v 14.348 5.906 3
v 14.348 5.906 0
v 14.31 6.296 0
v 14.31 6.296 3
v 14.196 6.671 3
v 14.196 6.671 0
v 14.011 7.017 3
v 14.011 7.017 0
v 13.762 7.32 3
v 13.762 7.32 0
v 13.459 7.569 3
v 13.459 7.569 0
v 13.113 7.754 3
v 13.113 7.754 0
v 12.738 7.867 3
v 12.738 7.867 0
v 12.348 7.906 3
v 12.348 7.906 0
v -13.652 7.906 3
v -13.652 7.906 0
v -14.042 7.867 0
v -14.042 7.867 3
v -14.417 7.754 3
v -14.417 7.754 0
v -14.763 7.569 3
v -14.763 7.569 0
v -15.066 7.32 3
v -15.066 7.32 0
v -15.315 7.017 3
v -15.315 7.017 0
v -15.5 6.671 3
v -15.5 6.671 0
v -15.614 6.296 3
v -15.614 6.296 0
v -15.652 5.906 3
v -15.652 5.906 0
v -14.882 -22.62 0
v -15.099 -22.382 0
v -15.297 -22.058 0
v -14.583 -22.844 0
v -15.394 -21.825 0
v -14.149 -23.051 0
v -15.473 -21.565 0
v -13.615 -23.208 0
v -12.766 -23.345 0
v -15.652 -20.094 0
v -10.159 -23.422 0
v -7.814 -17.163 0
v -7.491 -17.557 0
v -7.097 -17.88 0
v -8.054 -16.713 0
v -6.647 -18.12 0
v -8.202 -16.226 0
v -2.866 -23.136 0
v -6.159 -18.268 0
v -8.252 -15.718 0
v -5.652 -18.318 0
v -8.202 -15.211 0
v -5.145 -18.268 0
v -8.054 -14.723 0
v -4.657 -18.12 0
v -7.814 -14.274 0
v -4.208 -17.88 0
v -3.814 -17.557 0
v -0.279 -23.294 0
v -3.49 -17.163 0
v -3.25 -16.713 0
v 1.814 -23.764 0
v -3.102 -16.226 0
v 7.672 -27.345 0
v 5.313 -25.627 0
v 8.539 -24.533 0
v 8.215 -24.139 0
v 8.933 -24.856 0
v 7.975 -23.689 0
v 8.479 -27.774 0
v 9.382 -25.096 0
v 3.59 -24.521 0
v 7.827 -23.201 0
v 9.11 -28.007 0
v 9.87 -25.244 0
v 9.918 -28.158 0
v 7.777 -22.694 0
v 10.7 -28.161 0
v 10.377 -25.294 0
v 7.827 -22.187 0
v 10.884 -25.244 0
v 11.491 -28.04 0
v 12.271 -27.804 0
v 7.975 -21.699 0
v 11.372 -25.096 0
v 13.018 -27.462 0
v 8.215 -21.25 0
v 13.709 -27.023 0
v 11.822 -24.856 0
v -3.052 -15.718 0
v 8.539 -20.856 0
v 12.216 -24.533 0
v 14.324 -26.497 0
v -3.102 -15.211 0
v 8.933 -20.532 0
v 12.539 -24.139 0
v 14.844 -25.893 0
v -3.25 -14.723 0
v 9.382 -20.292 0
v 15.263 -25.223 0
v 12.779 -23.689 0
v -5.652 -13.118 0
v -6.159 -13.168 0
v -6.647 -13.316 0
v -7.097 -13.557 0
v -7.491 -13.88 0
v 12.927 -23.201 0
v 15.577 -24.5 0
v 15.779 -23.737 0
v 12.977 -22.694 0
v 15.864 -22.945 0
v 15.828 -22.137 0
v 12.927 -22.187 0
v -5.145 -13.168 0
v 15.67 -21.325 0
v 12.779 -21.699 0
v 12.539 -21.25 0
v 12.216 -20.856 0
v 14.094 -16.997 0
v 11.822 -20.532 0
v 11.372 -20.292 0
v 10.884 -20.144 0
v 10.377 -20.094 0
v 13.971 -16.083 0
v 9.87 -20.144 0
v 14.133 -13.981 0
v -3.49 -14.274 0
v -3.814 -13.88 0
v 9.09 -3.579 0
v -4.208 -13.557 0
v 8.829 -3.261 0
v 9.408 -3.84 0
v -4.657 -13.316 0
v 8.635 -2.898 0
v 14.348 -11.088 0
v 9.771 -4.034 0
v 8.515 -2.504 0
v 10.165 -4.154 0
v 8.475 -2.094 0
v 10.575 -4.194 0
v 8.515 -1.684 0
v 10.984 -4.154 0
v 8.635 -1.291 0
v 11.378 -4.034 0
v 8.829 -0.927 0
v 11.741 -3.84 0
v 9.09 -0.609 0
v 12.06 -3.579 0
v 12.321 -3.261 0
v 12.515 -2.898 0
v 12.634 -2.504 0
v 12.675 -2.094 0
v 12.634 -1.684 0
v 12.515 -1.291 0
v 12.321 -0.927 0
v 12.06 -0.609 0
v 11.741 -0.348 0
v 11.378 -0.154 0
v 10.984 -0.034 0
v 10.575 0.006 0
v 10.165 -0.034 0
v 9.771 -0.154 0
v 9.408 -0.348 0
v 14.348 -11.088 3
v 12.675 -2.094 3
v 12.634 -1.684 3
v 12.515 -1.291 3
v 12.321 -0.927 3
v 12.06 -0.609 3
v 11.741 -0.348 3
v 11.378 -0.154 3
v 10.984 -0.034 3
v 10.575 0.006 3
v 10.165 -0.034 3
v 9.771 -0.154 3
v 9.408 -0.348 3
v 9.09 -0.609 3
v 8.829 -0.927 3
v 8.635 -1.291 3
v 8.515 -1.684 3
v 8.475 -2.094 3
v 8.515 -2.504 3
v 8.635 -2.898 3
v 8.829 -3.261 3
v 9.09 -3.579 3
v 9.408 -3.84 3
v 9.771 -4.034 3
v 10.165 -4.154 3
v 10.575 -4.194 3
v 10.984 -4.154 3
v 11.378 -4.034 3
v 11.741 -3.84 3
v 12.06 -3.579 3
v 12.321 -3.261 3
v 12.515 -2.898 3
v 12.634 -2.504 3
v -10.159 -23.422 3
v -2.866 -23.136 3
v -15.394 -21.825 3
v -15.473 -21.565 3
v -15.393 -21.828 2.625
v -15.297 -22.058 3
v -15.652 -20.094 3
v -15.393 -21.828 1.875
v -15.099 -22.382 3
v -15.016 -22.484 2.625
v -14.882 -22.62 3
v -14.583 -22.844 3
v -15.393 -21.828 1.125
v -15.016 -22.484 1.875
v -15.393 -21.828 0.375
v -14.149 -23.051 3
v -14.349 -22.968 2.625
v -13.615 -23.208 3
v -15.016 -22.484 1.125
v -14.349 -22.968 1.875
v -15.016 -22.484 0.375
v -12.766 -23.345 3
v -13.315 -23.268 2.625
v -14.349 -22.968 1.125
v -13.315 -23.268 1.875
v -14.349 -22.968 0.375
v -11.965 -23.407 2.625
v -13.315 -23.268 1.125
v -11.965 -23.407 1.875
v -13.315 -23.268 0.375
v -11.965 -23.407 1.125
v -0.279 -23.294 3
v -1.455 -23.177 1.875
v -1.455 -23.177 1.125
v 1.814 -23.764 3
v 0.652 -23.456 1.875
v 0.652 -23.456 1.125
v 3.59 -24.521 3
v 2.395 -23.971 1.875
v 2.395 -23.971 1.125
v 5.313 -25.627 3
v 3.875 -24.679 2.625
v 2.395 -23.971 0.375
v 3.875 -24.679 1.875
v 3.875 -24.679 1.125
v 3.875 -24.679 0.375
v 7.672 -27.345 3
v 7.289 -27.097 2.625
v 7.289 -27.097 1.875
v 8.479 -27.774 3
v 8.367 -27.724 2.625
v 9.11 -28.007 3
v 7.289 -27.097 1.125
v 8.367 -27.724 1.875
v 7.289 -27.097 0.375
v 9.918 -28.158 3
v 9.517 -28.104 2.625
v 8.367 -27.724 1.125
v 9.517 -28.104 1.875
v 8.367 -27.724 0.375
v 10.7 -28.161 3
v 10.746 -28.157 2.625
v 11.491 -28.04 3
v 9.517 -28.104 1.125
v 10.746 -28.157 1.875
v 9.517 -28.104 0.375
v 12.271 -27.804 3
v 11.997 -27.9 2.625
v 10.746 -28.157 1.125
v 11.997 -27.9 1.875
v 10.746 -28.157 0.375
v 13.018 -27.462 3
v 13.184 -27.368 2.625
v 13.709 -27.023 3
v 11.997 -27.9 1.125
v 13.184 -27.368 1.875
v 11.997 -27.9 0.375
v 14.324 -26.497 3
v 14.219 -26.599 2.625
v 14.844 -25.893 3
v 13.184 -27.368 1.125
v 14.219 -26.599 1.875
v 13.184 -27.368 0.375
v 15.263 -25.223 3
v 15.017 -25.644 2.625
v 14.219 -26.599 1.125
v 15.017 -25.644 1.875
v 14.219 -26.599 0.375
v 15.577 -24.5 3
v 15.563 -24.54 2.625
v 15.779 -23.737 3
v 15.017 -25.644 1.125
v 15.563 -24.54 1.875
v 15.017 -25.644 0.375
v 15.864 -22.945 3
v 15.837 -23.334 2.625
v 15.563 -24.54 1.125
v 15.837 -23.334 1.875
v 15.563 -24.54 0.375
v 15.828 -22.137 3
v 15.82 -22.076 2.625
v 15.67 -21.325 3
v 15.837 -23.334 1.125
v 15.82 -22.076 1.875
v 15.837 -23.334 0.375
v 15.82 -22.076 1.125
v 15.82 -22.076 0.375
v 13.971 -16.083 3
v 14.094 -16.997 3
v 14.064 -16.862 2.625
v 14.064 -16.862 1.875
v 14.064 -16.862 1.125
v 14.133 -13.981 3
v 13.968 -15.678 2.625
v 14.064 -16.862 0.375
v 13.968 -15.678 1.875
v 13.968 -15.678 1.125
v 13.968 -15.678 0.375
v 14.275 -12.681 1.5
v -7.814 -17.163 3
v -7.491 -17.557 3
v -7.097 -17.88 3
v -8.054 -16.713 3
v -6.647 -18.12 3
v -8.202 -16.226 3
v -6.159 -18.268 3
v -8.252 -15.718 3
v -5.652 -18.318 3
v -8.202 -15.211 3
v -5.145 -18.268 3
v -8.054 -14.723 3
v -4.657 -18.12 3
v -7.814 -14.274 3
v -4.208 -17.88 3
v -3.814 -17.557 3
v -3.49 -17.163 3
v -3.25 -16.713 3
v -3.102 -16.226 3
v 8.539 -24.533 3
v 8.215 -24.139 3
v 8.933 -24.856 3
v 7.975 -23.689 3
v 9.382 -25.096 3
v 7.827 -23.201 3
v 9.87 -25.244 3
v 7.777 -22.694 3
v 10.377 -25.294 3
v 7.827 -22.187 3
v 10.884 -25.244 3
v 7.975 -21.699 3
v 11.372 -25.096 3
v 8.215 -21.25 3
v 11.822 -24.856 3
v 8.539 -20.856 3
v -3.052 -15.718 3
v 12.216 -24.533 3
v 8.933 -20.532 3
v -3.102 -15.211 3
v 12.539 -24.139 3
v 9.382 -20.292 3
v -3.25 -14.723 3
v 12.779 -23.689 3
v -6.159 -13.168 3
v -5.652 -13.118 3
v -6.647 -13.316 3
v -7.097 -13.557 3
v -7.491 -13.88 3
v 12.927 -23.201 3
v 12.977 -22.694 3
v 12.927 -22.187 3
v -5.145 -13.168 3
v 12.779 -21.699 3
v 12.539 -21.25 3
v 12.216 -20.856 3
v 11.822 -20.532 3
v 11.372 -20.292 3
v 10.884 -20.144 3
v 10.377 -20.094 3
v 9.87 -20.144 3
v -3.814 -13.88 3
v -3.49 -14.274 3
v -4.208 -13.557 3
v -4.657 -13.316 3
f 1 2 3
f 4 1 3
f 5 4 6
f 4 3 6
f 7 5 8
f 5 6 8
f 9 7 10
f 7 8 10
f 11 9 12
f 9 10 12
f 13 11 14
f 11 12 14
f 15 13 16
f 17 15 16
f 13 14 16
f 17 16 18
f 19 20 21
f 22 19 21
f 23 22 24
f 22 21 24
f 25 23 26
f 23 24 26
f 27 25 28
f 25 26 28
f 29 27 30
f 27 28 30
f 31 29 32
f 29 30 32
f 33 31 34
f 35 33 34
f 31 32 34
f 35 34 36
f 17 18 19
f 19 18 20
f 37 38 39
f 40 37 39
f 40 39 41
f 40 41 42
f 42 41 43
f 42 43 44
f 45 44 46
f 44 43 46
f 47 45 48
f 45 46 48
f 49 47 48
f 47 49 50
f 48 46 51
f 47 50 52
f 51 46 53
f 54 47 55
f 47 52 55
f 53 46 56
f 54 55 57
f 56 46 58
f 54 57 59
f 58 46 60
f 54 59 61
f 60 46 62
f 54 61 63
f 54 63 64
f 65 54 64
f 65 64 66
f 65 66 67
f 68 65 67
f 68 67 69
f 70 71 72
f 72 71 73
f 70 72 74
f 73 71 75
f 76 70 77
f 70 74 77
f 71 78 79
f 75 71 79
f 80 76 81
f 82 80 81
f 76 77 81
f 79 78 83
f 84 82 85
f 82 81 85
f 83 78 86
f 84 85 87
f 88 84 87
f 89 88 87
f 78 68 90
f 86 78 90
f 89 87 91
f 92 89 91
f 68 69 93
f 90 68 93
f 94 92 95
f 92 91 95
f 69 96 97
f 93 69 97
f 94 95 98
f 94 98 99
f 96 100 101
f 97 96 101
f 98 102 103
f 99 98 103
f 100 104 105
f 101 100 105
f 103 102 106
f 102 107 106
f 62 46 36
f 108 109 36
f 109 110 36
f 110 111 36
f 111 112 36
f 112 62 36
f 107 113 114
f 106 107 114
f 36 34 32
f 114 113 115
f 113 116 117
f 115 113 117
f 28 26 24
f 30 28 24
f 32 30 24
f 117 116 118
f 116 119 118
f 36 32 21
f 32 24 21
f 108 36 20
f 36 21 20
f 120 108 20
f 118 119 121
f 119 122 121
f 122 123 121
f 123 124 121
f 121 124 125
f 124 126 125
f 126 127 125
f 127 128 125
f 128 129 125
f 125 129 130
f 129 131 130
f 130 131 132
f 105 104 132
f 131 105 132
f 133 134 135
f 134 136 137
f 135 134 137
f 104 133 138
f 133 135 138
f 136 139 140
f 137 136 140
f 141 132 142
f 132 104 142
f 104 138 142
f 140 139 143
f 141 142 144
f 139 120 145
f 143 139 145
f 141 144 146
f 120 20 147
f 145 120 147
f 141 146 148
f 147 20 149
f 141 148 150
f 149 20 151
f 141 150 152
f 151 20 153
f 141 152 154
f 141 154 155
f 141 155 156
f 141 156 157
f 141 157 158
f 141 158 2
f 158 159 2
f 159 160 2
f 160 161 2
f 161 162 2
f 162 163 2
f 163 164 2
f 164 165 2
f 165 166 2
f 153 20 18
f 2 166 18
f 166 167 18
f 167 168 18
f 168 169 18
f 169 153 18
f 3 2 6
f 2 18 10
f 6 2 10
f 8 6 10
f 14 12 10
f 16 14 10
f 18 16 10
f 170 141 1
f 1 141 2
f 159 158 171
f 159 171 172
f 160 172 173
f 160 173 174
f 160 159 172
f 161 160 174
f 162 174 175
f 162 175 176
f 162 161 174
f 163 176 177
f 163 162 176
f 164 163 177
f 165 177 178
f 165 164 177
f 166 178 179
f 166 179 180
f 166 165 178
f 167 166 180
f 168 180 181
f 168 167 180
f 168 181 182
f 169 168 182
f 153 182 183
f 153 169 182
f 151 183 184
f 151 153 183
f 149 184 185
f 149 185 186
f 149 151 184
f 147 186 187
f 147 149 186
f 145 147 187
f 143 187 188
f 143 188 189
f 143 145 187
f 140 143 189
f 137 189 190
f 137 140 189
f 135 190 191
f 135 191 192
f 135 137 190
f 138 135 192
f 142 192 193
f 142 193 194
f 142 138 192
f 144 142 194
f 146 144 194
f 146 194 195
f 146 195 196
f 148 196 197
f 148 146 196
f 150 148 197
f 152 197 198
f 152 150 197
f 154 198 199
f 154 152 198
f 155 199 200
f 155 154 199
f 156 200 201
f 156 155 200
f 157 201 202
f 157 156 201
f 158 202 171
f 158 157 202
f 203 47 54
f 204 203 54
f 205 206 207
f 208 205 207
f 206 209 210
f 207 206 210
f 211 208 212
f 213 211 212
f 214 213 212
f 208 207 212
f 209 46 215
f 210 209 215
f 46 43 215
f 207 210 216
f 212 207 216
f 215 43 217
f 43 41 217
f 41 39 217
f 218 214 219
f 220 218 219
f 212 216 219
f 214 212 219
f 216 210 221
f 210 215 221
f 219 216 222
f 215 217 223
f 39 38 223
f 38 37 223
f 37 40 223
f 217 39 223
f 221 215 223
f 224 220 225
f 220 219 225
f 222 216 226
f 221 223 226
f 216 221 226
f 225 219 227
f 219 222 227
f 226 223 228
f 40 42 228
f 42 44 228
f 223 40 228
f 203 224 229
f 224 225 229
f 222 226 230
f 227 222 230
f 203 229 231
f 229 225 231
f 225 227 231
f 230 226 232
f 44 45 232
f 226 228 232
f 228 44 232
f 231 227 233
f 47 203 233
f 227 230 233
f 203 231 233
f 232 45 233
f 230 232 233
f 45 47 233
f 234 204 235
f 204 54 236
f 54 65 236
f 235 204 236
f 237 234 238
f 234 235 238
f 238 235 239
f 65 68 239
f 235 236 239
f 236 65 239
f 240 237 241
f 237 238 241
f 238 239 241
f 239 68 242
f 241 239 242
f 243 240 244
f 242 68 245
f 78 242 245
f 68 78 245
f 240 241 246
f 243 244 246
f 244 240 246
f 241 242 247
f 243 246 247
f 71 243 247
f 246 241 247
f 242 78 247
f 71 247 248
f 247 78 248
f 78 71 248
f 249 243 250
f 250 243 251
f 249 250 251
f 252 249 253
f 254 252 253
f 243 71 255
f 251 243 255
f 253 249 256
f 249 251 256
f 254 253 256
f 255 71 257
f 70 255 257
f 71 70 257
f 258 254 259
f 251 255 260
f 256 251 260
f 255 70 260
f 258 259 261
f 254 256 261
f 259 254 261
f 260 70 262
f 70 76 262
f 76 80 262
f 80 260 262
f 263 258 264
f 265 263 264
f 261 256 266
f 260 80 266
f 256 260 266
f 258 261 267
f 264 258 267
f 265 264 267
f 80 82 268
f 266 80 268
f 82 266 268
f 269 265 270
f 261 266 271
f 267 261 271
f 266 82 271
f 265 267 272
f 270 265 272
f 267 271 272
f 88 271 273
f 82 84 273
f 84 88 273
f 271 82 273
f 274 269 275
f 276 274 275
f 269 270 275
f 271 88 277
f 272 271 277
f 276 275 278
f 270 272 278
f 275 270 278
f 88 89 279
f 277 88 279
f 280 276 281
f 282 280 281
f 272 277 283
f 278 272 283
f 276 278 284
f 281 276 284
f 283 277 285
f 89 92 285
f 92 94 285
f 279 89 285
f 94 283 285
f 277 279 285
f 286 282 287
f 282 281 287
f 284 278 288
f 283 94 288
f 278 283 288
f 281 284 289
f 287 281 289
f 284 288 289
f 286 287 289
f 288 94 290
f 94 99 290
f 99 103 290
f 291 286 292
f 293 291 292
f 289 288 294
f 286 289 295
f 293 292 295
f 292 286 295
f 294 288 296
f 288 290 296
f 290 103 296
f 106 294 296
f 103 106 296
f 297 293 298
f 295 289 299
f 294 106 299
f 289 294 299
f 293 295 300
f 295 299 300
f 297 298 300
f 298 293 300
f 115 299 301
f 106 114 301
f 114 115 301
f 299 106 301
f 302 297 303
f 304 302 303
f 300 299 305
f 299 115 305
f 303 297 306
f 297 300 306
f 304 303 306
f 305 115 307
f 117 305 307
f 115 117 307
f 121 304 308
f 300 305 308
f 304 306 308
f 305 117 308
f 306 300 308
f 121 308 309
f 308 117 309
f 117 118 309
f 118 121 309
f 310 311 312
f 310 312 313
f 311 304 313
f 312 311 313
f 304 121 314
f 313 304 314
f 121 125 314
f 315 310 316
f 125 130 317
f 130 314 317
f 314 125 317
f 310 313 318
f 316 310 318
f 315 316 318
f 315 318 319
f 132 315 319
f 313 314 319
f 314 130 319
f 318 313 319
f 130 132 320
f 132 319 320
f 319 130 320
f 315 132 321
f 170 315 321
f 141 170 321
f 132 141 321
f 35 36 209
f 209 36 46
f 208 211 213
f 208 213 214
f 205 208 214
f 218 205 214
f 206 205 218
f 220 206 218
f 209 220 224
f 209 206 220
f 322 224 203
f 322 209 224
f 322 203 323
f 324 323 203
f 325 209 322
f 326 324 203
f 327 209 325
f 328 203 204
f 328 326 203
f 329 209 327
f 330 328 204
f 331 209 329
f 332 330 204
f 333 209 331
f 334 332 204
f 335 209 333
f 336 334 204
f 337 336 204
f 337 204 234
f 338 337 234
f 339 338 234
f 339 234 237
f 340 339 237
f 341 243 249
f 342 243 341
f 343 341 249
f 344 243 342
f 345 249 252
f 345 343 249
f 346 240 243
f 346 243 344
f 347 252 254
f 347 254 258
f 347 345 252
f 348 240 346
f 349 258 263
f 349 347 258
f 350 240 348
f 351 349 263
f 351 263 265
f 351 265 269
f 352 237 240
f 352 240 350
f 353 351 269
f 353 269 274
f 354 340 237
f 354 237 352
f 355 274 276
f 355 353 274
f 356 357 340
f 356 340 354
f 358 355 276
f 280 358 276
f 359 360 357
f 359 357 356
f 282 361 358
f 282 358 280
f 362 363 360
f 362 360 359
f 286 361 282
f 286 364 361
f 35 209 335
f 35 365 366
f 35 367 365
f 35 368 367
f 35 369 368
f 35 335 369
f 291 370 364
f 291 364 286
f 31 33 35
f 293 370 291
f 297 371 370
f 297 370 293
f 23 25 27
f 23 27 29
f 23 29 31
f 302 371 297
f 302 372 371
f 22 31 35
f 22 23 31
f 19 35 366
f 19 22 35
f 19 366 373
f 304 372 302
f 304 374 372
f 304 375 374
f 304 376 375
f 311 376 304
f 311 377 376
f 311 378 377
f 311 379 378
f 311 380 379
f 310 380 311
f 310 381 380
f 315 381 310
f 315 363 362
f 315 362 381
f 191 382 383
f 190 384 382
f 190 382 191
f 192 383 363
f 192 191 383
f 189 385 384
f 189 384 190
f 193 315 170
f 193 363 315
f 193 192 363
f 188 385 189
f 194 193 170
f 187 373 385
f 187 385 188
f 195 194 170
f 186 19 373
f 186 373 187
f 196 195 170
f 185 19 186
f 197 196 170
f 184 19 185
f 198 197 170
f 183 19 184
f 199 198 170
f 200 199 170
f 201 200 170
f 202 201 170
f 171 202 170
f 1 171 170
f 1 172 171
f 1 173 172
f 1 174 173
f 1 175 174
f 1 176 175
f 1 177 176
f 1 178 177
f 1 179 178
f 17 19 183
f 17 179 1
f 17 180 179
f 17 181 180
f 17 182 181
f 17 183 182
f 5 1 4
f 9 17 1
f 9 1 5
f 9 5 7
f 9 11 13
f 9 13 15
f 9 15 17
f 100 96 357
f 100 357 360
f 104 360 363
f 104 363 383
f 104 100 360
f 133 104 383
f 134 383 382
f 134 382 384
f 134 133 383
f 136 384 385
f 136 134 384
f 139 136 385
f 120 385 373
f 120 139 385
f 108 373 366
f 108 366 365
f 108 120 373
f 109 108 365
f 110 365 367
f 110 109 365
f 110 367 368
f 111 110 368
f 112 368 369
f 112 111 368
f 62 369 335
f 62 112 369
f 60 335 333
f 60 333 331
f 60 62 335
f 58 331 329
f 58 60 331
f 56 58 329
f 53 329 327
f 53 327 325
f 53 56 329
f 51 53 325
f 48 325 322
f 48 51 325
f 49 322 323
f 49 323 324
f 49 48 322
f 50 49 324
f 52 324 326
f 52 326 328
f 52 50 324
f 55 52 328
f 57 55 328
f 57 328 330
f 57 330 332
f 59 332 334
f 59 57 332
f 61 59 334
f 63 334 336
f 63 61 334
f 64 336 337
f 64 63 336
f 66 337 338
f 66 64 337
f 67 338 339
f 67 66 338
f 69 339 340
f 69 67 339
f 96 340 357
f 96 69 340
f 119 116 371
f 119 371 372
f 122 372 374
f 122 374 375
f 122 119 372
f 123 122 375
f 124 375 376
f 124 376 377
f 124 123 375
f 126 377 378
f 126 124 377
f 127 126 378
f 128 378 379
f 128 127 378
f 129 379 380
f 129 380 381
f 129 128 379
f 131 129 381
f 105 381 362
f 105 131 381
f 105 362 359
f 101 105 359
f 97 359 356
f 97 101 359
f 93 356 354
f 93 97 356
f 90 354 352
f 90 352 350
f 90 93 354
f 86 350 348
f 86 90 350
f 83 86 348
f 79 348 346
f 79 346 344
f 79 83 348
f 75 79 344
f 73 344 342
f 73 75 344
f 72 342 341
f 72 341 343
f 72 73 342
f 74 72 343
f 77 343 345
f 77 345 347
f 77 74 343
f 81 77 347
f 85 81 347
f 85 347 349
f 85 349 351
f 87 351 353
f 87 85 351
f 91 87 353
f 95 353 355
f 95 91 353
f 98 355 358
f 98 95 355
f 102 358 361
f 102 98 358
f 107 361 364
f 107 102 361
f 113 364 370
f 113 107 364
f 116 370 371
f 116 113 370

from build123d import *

# Parameters (mm, degrees)
F0_R     = 2.6
F0_R_2   = 2.1
F1_DEPTH = 3


with BuildPart() as f1:
    # F0 (on Top) → F1 (new body)
    with BuildSketch(Plane.XY):
        with BuildLine():
            Line((12.3479472026, 7.9058583081), (-13.6520527974, 7.9058583081))
            ThreePointArc((-13.6520527974, 7.9058583081), (-15.0662663598, 7.3200718704), (-15.6520527974, 5.9058583081))
            Line((-15.6520527974, 5.9058583081), (-15.6520527974, -20.0941416919))
            add(Edge.make_bspline(
                [(-15.6520527974, -20.0941416919), (-15.5751293037, -21.4033594279), (-15.2635781681, -24.5634502002), (-0.8787874809, -22.0988449664), (5.0756230648, -25.1076771756), (9.2072850265, -29.0327234408), (14.8289471052, -27.1474559823), (16.6930721896, -21.9723878023), (13.1588311211, -16.5555052211), (14.3295111489, -13.9155043625), (14.3479472026, -11.0878590494)],
                knots=[0, 0, 0, 0, 0.0914376173, 0.2762733003, 0.4129615686, 0.5284098194, 0.6427719716, 0.7555166389, 0.8762466025, 1, 1, 1, 1], degree=3))
            Line((14.3479472026, -11.0878590494), (14.3479472026, 5.9058583081))
            ThreePointArc((14.3479472026, 5.9058583081), (13.762160765, 7.3200718704), (12.3479472026, 7.9058583081))
        make_face()
        with Locations((-5.6520527974, -15.7183334231)):
            Circle(F0_R, mode=Mode.SUBTRACT)
        with Locations((10.3771137074, -22.6941416919)):
            Circle(F0_R, mode=Mode.SUBTRACT)
        with Locations((10.5747394032, -2.0941416919)):
            Circle(F0_R_2, mode=Mode.SUBTRACT)
    extrude(amount=F1_DEPTH)


solid = f1.part
